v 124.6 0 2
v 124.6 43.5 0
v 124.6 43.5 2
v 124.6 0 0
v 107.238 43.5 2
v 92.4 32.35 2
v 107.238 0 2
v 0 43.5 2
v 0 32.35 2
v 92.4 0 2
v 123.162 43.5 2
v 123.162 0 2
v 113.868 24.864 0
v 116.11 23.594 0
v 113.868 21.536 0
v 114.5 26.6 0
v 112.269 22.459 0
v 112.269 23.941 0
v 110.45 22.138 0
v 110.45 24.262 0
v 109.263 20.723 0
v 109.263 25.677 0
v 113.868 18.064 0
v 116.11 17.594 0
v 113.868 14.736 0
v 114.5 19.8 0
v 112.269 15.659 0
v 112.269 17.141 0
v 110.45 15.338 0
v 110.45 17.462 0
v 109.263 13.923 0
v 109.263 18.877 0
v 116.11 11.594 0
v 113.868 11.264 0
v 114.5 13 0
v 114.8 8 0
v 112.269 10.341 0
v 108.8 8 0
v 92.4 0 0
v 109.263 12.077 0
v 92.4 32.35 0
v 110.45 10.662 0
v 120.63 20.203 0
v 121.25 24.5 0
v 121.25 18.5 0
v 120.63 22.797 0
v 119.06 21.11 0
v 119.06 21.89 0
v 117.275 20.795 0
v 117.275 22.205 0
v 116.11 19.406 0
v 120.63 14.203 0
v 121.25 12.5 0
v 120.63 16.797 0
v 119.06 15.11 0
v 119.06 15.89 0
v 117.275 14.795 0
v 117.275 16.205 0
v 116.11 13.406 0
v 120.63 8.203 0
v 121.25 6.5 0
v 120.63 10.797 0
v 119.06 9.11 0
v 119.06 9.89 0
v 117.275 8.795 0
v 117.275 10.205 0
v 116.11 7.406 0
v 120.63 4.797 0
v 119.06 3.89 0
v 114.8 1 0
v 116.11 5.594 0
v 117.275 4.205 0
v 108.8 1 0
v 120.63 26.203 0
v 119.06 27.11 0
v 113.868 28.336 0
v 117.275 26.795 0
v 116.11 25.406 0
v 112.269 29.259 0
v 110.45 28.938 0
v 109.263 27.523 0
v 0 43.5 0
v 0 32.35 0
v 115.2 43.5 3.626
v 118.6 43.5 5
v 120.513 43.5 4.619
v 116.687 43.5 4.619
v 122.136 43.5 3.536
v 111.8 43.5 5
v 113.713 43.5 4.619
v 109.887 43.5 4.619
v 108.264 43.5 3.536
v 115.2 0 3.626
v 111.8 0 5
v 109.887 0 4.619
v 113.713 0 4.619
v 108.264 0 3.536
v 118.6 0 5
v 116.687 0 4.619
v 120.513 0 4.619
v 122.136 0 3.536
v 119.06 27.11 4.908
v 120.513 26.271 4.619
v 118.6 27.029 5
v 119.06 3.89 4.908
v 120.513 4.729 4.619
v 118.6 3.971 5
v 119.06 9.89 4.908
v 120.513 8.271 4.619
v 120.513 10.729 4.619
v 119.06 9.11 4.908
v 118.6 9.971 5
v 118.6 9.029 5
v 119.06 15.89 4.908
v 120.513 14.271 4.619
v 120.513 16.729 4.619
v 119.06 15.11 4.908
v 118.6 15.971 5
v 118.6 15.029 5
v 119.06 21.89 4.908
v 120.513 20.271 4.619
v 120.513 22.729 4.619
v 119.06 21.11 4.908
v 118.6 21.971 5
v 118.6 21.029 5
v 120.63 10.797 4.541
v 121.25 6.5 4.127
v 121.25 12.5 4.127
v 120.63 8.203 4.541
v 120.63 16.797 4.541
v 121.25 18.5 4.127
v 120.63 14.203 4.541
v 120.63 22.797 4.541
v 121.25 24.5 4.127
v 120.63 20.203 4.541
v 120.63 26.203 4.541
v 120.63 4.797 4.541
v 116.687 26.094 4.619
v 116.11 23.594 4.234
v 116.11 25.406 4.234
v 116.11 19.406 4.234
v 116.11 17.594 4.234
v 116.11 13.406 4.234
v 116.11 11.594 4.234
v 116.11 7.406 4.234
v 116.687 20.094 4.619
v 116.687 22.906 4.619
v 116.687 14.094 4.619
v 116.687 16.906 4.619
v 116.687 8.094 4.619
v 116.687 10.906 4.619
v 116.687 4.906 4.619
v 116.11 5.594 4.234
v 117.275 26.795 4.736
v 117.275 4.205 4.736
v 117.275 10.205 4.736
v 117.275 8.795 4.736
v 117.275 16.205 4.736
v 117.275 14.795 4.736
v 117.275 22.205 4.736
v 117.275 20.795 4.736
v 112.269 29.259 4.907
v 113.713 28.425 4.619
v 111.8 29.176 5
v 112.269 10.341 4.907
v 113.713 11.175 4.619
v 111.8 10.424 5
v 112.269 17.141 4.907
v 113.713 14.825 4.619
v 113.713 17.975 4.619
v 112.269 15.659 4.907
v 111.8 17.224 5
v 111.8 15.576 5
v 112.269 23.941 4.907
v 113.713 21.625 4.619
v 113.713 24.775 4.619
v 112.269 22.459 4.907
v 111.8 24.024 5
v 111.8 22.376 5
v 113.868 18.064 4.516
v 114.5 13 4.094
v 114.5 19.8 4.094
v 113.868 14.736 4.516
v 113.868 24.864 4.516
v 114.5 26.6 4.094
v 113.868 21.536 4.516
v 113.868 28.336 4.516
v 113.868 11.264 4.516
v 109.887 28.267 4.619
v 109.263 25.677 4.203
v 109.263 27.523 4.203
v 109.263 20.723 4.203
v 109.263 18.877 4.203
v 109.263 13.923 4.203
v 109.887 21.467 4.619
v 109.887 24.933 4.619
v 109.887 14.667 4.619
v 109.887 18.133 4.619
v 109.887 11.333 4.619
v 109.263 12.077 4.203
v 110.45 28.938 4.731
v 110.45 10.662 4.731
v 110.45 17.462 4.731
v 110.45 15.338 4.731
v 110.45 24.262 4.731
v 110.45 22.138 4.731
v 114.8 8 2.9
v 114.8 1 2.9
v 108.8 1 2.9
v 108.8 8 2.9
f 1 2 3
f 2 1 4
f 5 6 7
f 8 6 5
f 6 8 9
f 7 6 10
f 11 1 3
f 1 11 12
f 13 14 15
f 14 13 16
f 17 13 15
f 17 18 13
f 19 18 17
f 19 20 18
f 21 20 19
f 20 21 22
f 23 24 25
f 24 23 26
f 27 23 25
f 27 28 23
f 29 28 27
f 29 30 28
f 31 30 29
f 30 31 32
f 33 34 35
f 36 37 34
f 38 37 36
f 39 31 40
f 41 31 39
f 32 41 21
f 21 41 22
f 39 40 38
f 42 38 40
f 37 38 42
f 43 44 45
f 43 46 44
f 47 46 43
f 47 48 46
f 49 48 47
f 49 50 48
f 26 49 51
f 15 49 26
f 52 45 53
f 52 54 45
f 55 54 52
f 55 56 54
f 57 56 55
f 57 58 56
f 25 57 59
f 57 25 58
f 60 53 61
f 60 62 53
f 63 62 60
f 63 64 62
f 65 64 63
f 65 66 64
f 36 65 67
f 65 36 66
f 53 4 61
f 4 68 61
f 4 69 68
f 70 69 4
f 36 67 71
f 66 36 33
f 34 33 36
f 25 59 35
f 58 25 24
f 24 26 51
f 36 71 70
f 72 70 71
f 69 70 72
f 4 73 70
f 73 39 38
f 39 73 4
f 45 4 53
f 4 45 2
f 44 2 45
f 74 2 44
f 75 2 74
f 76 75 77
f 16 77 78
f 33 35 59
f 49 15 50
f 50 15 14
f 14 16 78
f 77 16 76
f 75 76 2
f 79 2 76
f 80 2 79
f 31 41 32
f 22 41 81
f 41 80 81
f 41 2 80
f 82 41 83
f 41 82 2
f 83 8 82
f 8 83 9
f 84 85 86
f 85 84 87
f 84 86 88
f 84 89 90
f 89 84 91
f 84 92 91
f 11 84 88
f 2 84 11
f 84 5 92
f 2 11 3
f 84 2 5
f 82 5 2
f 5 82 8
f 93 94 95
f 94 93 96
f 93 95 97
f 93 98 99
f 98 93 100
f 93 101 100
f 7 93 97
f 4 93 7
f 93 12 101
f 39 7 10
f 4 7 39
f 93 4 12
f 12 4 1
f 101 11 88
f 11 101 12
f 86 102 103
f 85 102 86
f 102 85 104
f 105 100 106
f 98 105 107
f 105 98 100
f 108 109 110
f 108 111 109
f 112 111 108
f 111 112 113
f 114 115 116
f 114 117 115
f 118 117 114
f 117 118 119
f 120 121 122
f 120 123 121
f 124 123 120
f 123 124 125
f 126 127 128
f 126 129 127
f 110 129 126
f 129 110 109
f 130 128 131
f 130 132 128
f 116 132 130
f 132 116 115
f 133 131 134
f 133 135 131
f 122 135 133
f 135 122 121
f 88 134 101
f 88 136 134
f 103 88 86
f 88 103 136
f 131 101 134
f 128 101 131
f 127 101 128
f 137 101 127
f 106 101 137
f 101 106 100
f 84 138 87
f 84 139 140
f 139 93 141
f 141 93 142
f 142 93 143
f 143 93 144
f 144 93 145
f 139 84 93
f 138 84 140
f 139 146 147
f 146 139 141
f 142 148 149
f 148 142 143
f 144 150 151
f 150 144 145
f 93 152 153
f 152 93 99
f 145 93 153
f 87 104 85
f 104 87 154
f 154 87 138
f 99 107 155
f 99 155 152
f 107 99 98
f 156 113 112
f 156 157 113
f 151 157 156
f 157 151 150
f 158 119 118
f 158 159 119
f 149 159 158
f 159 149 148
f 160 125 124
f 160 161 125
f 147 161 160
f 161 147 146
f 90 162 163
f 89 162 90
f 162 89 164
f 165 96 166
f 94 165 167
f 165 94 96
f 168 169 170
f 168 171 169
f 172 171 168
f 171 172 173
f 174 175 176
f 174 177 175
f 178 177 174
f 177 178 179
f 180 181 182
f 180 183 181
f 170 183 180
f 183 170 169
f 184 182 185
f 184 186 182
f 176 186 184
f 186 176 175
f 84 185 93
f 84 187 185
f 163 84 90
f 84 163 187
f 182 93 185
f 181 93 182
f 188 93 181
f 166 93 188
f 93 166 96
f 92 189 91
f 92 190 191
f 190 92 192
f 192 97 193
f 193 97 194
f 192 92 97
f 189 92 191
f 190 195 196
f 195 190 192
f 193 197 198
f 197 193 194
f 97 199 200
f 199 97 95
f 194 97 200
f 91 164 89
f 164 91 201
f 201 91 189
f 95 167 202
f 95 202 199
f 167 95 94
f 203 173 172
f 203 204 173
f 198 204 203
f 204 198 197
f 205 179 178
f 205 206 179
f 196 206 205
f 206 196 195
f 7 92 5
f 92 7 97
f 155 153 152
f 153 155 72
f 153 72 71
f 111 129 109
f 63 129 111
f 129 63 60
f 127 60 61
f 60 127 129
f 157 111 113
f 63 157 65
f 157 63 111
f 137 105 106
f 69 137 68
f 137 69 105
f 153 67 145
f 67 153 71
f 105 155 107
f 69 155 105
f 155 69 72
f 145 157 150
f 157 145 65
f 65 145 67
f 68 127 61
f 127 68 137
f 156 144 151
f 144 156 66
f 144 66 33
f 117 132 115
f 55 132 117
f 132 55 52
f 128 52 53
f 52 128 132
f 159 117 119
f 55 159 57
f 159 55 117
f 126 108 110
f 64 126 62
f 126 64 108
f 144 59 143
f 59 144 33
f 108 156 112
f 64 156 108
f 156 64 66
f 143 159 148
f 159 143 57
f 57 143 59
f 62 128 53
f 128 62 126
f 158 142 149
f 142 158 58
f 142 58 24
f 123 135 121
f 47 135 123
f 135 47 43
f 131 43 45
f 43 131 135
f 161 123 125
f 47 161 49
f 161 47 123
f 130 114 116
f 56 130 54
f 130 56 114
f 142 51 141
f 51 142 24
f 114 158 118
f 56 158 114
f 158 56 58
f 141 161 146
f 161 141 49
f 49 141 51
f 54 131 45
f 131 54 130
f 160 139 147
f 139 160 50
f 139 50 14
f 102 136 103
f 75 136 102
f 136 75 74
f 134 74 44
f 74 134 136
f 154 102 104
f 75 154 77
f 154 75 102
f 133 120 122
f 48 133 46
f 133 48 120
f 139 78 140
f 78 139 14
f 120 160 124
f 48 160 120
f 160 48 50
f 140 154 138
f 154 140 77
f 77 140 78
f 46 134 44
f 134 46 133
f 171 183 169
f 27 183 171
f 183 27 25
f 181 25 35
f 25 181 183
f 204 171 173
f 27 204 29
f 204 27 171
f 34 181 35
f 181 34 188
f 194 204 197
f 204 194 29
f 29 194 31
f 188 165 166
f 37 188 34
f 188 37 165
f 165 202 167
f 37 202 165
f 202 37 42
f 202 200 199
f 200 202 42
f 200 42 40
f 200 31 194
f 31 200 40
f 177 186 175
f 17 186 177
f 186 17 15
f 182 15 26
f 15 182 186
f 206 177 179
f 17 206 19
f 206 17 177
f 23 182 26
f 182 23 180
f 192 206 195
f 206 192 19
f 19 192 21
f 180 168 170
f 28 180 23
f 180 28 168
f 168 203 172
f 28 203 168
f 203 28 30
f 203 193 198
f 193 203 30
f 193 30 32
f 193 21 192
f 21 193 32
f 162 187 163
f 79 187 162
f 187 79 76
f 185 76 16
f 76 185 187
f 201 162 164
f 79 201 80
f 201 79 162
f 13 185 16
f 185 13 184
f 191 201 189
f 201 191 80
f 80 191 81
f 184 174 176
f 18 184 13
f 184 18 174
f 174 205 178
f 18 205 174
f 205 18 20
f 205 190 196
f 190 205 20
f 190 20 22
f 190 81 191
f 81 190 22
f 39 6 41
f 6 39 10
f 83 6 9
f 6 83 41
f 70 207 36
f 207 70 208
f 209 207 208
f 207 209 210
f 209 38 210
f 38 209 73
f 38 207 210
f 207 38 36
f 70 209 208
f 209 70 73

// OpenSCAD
// A top plate for the fisher-pi

$width=124.6;
$depth=43.5;
$height=2;

$lcdwidth=92.5;
$lcddepth=32.45;

$ledd=4.4 + 1;
$switchd=3.3 + 2;

$lcdtoled=19.3;
$lcdtoswitch=26.1;

module hole(d) {
  translate([0, 0, -0.5]){
    cylinder(r=(d / 2), h=$height + 100);
  }
}

module led() {
  hole(d=$ledd);
}

module switch() {
  hole(d=$switchd);
}

module switches() {
  for (l = [0, 1, 2, 3]) {
    translate([0, (6 * l), 0]){
      switch();
    }
  }
}

module leds() {
  for (l = [0, 1, 2]) {
    translate([0, (6.8 * l), 0]){
      led();
    }
  }
}

module base (){
  cube([$width, $depth, $height]);
}

module lcd() {
  translate([-0.1, -0.1, -0.5]){
    cube([$lcdwidth, $lcddepth, $height + 1]);
  }
}

module hump() {
  translate([$lcdwidth+ $lcdtoswitch, $depth, 0]) {
    rotate([90, 0, 0]) {
      cylinder(h=$depth, r=5);
    }
  }
}


module main() {
  difference() {
    union() {
      base();
      hump();
      translate([(- ($lcdtoswitch - $lcdtoled)), 0, 0]) {
        hump();
      }
    }
    translate([($lcdwidth + $lcdtoswitch), 6.5, 0]){
      switches();
    }
    translate([($lcdwidth + $lcdtoled), 13, 0]){
      leds();
    }
    lcd();
    // Cut out for trimmer cap
    translate([($lcdwidth + $lcdtoled -3), 1, -0.1]){
      #cube([6, 7, 3]);
    }
    // Clean the base
    translate([-5, -5, -10]) {
      cube([200,200,10]);
    }
  }

}

main();
